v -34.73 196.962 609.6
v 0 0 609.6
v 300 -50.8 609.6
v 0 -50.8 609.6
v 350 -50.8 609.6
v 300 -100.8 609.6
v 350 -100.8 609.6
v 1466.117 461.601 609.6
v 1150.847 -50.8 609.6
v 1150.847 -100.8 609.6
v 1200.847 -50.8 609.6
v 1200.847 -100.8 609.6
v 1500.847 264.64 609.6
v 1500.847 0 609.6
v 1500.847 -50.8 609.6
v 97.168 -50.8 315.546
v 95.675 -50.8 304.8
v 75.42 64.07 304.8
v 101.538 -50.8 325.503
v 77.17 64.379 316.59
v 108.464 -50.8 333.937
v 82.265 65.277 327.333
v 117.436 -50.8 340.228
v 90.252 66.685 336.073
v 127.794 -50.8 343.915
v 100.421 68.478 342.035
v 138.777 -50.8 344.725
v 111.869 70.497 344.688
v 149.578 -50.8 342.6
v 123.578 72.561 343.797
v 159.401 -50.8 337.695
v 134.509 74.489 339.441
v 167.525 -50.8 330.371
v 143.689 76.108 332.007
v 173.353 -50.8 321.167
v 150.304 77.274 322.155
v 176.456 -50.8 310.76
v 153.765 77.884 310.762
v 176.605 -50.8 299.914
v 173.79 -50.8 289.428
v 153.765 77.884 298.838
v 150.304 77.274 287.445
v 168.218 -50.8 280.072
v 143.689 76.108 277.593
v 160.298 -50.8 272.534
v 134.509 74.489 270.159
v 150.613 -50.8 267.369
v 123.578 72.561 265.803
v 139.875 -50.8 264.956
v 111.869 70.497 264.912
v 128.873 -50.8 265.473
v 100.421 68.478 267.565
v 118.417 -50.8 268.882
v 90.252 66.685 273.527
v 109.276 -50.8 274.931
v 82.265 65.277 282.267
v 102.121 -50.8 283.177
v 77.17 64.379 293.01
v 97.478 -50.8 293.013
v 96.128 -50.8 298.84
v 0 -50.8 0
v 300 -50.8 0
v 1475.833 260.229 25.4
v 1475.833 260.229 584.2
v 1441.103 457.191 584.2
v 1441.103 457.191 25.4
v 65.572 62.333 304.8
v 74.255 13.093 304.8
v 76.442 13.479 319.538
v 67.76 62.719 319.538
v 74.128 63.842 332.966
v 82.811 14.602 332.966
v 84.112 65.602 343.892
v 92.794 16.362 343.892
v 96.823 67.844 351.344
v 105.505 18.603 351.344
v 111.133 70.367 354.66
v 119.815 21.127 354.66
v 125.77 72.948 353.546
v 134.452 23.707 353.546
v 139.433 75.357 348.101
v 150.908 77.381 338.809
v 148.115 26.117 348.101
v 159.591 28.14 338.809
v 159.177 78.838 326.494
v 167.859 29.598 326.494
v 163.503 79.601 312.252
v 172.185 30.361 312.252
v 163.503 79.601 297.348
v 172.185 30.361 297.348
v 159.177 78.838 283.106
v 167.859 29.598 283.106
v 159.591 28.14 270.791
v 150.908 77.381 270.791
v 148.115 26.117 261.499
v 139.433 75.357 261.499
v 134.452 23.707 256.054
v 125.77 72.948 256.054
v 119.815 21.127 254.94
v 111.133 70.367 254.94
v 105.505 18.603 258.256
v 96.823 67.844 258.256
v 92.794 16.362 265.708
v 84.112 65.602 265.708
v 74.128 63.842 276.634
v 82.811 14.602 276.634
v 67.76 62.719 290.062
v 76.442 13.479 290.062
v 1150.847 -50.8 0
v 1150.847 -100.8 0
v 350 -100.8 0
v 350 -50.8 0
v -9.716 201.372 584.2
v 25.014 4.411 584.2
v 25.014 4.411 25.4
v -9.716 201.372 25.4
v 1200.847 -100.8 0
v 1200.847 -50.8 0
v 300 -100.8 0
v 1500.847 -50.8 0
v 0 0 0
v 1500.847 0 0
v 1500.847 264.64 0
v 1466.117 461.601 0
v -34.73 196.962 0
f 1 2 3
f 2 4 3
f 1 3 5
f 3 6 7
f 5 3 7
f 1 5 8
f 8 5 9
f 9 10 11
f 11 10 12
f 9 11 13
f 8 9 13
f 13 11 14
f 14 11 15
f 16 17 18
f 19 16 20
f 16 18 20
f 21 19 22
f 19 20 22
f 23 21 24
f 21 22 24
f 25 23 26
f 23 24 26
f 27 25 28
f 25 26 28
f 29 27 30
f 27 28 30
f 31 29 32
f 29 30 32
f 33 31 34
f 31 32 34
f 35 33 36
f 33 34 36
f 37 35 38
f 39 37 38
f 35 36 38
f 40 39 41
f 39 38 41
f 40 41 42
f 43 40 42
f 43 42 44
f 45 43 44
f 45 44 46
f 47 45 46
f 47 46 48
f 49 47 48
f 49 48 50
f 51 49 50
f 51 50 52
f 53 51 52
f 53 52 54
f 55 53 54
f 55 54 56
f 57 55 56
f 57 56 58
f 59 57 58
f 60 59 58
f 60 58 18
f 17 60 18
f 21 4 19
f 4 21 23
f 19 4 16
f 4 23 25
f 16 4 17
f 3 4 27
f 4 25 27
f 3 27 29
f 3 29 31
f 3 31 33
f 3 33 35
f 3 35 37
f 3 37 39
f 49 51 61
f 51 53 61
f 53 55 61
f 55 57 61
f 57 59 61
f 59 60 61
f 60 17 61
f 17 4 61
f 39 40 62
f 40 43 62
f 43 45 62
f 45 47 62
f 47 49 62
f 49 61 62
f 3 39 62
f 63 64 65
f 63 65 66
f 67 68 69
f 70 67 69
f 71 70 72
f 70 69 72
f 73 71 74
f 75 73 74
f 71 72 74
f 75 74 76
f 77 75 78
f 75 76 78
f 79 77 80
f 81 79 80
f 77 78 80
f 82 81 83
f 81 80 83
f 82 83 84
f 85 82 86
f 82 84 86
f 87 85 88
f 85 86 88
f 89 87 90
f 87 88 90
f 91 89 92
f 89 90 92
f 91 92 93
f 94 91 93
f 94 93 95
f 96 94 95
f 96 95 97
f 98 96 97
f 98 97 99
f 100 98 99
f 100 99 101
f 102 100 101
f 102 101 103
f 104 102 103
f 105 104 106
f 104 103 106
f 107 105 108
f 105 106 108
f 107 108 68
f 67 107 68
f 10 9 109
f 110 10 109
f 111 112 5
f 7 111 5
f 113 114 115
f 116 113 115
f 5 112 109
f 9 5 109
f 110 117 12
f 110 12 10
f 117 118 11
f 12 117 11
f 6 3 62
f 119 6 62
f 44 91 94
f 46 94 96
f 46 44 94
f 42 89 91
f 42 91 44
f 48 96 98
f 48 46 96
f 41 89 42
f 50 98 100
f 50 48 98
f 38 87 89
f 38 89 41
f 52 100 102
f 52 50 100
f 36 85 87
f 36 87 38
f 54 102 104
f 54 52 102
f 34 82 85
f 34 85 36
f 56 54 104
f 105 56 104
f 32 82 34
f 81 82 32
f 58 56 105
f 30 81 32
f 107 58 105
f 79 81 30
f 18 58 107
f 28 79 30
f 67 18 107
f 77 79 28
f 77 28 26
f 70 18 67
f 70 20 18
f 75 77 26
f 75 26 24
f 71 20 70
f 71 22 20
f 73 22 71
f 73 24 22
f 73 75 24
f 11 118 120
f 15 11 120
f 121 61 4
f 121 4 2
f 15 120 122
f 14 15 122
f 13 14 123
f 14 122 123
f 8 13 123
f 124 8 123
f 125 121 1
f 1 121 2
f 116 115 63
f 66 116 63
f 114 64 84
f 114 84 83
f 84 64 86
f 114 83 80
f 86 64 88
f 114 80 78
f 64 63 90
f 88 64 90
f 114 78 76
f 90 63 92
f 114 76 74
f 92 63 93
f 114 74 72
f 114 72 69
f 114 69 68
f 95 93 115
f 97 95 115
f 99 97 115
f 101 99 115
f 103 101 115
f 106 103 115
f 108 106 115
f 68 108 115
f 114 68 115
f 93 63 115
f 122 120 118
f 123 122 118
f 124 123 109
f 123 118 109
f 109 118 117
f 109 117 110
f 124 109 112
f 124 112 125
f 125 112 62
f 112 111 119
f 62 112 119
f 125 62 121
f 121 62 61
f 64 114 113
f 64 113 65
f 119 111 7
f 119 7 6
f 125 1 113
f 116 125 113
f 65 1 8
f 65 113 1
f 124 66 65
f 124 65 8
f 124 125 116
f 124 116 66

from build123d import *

# Parameters (mm, degrees)
SKETCH1_W           = 1500.847015591
SKETCH1_H           = 50.8
BOSS_EXTRUDE2_DEPTH = 609.6
SKETCH3_W           = 1473.2
SKETCH3_H           = 558.8
BOSS_EXTRUDE4_DEPTH = 200
SKETCH4_R           = 50
BOSS_EXTRUDE5_DEPTH = 50
SKETCH5_R           = 40
CUT_EXTRUDE3_DEPTH  = 200
BOSS_EXTRUDE6_DEPTH = 50


with BuildPart() as part:
    # Sketch1 → Boss-Extrude2 (new body)
    with BuildSketch(Plane.XY):
        Polygon((0, 0), (1500.847015591, 0), (1500.847015591, 264.639822764), align=None)
        with Locations((750.423507796, -25.4)):
            Rectangle(SKETCH1_W, SKETCH1_H)
    extrude(amount=BOSS_EXTRUDE2_DEPTH)

    # Sketch3 → Boss-Extrude4 (add)
    with BuildSketch(Plane(origin=(0, 0, 0), x_dir=(0.9848077530122079, 0.17364817766693136, 0), z_dir=(-0.17364817766693136, 0.9848077530122079, 0))):
        Polygon((1524, 0), (0, 0), (0, -25.4), (0, -609.6), (1524, -609.6), align=None)
        with Locations((762, -304.8)):
            Rectangle(SKETCH3_W, SKETCH3_H, mode=Mode.SUBTRACT)
    extrude(amount=BOSS_EXTRUDE4_DEPTH)

    # Sketch4 → Boss-Extrude5 (add)
    with BuildSketch(Plane(origin=(0, 0, 0), x_dir=(0.9848077530122079, 0.17364817766693136, 0), z_dir=(-0.17364817766693136, 0.9848077530122079, 0))):
        with Locations(Location((125.4, -304.8, 0), (0, 0, 180))):
            Circle(SKETCH4_R)
    extrude(amount=BOSS_EXTRUDE5_DEPTH)

    # Sketch5 → Cut-Extrude3 (cut)
    with BuildSketch(Plane(origin=(-8.682408883, 49.240387651, 0), x_dir=(0.9848077530122079, 0.17364817766693136, 0), z_dir=(-0.17364817766693136, 0.9848077530122079, 0))):
        with Locations(Location((125.4, -304.8, 0), (0, 0, 180))):
            Circle(SKETCH5_R)
    extrude(amount=-CUT_EXTRUDE3_DEPTH, mode=Mode.SUBTRACT)

    # Sketch6 → Boss-Extrude6 (add)
    with BuildSketch(Plane(origin=(0, -50.8, 0), x_dir=(-1, 0, 0), z_dir=(0, -1, 0))):
        Polygon((-350, 0), (-350, -609.6), (-300, -609.6), (-300, -304.8), (-300, 0), align=None)
        Polygon((-1200.847015591, 0), (-1200.847015591, -304.8), (-1200.847015591, -609.6), (-1150.847015591, -609.6), (-1150.847015591, 0), align=None)
    extrude(amount=BOSS_EXTRUDE6_DEPTH)


solid = part.part
